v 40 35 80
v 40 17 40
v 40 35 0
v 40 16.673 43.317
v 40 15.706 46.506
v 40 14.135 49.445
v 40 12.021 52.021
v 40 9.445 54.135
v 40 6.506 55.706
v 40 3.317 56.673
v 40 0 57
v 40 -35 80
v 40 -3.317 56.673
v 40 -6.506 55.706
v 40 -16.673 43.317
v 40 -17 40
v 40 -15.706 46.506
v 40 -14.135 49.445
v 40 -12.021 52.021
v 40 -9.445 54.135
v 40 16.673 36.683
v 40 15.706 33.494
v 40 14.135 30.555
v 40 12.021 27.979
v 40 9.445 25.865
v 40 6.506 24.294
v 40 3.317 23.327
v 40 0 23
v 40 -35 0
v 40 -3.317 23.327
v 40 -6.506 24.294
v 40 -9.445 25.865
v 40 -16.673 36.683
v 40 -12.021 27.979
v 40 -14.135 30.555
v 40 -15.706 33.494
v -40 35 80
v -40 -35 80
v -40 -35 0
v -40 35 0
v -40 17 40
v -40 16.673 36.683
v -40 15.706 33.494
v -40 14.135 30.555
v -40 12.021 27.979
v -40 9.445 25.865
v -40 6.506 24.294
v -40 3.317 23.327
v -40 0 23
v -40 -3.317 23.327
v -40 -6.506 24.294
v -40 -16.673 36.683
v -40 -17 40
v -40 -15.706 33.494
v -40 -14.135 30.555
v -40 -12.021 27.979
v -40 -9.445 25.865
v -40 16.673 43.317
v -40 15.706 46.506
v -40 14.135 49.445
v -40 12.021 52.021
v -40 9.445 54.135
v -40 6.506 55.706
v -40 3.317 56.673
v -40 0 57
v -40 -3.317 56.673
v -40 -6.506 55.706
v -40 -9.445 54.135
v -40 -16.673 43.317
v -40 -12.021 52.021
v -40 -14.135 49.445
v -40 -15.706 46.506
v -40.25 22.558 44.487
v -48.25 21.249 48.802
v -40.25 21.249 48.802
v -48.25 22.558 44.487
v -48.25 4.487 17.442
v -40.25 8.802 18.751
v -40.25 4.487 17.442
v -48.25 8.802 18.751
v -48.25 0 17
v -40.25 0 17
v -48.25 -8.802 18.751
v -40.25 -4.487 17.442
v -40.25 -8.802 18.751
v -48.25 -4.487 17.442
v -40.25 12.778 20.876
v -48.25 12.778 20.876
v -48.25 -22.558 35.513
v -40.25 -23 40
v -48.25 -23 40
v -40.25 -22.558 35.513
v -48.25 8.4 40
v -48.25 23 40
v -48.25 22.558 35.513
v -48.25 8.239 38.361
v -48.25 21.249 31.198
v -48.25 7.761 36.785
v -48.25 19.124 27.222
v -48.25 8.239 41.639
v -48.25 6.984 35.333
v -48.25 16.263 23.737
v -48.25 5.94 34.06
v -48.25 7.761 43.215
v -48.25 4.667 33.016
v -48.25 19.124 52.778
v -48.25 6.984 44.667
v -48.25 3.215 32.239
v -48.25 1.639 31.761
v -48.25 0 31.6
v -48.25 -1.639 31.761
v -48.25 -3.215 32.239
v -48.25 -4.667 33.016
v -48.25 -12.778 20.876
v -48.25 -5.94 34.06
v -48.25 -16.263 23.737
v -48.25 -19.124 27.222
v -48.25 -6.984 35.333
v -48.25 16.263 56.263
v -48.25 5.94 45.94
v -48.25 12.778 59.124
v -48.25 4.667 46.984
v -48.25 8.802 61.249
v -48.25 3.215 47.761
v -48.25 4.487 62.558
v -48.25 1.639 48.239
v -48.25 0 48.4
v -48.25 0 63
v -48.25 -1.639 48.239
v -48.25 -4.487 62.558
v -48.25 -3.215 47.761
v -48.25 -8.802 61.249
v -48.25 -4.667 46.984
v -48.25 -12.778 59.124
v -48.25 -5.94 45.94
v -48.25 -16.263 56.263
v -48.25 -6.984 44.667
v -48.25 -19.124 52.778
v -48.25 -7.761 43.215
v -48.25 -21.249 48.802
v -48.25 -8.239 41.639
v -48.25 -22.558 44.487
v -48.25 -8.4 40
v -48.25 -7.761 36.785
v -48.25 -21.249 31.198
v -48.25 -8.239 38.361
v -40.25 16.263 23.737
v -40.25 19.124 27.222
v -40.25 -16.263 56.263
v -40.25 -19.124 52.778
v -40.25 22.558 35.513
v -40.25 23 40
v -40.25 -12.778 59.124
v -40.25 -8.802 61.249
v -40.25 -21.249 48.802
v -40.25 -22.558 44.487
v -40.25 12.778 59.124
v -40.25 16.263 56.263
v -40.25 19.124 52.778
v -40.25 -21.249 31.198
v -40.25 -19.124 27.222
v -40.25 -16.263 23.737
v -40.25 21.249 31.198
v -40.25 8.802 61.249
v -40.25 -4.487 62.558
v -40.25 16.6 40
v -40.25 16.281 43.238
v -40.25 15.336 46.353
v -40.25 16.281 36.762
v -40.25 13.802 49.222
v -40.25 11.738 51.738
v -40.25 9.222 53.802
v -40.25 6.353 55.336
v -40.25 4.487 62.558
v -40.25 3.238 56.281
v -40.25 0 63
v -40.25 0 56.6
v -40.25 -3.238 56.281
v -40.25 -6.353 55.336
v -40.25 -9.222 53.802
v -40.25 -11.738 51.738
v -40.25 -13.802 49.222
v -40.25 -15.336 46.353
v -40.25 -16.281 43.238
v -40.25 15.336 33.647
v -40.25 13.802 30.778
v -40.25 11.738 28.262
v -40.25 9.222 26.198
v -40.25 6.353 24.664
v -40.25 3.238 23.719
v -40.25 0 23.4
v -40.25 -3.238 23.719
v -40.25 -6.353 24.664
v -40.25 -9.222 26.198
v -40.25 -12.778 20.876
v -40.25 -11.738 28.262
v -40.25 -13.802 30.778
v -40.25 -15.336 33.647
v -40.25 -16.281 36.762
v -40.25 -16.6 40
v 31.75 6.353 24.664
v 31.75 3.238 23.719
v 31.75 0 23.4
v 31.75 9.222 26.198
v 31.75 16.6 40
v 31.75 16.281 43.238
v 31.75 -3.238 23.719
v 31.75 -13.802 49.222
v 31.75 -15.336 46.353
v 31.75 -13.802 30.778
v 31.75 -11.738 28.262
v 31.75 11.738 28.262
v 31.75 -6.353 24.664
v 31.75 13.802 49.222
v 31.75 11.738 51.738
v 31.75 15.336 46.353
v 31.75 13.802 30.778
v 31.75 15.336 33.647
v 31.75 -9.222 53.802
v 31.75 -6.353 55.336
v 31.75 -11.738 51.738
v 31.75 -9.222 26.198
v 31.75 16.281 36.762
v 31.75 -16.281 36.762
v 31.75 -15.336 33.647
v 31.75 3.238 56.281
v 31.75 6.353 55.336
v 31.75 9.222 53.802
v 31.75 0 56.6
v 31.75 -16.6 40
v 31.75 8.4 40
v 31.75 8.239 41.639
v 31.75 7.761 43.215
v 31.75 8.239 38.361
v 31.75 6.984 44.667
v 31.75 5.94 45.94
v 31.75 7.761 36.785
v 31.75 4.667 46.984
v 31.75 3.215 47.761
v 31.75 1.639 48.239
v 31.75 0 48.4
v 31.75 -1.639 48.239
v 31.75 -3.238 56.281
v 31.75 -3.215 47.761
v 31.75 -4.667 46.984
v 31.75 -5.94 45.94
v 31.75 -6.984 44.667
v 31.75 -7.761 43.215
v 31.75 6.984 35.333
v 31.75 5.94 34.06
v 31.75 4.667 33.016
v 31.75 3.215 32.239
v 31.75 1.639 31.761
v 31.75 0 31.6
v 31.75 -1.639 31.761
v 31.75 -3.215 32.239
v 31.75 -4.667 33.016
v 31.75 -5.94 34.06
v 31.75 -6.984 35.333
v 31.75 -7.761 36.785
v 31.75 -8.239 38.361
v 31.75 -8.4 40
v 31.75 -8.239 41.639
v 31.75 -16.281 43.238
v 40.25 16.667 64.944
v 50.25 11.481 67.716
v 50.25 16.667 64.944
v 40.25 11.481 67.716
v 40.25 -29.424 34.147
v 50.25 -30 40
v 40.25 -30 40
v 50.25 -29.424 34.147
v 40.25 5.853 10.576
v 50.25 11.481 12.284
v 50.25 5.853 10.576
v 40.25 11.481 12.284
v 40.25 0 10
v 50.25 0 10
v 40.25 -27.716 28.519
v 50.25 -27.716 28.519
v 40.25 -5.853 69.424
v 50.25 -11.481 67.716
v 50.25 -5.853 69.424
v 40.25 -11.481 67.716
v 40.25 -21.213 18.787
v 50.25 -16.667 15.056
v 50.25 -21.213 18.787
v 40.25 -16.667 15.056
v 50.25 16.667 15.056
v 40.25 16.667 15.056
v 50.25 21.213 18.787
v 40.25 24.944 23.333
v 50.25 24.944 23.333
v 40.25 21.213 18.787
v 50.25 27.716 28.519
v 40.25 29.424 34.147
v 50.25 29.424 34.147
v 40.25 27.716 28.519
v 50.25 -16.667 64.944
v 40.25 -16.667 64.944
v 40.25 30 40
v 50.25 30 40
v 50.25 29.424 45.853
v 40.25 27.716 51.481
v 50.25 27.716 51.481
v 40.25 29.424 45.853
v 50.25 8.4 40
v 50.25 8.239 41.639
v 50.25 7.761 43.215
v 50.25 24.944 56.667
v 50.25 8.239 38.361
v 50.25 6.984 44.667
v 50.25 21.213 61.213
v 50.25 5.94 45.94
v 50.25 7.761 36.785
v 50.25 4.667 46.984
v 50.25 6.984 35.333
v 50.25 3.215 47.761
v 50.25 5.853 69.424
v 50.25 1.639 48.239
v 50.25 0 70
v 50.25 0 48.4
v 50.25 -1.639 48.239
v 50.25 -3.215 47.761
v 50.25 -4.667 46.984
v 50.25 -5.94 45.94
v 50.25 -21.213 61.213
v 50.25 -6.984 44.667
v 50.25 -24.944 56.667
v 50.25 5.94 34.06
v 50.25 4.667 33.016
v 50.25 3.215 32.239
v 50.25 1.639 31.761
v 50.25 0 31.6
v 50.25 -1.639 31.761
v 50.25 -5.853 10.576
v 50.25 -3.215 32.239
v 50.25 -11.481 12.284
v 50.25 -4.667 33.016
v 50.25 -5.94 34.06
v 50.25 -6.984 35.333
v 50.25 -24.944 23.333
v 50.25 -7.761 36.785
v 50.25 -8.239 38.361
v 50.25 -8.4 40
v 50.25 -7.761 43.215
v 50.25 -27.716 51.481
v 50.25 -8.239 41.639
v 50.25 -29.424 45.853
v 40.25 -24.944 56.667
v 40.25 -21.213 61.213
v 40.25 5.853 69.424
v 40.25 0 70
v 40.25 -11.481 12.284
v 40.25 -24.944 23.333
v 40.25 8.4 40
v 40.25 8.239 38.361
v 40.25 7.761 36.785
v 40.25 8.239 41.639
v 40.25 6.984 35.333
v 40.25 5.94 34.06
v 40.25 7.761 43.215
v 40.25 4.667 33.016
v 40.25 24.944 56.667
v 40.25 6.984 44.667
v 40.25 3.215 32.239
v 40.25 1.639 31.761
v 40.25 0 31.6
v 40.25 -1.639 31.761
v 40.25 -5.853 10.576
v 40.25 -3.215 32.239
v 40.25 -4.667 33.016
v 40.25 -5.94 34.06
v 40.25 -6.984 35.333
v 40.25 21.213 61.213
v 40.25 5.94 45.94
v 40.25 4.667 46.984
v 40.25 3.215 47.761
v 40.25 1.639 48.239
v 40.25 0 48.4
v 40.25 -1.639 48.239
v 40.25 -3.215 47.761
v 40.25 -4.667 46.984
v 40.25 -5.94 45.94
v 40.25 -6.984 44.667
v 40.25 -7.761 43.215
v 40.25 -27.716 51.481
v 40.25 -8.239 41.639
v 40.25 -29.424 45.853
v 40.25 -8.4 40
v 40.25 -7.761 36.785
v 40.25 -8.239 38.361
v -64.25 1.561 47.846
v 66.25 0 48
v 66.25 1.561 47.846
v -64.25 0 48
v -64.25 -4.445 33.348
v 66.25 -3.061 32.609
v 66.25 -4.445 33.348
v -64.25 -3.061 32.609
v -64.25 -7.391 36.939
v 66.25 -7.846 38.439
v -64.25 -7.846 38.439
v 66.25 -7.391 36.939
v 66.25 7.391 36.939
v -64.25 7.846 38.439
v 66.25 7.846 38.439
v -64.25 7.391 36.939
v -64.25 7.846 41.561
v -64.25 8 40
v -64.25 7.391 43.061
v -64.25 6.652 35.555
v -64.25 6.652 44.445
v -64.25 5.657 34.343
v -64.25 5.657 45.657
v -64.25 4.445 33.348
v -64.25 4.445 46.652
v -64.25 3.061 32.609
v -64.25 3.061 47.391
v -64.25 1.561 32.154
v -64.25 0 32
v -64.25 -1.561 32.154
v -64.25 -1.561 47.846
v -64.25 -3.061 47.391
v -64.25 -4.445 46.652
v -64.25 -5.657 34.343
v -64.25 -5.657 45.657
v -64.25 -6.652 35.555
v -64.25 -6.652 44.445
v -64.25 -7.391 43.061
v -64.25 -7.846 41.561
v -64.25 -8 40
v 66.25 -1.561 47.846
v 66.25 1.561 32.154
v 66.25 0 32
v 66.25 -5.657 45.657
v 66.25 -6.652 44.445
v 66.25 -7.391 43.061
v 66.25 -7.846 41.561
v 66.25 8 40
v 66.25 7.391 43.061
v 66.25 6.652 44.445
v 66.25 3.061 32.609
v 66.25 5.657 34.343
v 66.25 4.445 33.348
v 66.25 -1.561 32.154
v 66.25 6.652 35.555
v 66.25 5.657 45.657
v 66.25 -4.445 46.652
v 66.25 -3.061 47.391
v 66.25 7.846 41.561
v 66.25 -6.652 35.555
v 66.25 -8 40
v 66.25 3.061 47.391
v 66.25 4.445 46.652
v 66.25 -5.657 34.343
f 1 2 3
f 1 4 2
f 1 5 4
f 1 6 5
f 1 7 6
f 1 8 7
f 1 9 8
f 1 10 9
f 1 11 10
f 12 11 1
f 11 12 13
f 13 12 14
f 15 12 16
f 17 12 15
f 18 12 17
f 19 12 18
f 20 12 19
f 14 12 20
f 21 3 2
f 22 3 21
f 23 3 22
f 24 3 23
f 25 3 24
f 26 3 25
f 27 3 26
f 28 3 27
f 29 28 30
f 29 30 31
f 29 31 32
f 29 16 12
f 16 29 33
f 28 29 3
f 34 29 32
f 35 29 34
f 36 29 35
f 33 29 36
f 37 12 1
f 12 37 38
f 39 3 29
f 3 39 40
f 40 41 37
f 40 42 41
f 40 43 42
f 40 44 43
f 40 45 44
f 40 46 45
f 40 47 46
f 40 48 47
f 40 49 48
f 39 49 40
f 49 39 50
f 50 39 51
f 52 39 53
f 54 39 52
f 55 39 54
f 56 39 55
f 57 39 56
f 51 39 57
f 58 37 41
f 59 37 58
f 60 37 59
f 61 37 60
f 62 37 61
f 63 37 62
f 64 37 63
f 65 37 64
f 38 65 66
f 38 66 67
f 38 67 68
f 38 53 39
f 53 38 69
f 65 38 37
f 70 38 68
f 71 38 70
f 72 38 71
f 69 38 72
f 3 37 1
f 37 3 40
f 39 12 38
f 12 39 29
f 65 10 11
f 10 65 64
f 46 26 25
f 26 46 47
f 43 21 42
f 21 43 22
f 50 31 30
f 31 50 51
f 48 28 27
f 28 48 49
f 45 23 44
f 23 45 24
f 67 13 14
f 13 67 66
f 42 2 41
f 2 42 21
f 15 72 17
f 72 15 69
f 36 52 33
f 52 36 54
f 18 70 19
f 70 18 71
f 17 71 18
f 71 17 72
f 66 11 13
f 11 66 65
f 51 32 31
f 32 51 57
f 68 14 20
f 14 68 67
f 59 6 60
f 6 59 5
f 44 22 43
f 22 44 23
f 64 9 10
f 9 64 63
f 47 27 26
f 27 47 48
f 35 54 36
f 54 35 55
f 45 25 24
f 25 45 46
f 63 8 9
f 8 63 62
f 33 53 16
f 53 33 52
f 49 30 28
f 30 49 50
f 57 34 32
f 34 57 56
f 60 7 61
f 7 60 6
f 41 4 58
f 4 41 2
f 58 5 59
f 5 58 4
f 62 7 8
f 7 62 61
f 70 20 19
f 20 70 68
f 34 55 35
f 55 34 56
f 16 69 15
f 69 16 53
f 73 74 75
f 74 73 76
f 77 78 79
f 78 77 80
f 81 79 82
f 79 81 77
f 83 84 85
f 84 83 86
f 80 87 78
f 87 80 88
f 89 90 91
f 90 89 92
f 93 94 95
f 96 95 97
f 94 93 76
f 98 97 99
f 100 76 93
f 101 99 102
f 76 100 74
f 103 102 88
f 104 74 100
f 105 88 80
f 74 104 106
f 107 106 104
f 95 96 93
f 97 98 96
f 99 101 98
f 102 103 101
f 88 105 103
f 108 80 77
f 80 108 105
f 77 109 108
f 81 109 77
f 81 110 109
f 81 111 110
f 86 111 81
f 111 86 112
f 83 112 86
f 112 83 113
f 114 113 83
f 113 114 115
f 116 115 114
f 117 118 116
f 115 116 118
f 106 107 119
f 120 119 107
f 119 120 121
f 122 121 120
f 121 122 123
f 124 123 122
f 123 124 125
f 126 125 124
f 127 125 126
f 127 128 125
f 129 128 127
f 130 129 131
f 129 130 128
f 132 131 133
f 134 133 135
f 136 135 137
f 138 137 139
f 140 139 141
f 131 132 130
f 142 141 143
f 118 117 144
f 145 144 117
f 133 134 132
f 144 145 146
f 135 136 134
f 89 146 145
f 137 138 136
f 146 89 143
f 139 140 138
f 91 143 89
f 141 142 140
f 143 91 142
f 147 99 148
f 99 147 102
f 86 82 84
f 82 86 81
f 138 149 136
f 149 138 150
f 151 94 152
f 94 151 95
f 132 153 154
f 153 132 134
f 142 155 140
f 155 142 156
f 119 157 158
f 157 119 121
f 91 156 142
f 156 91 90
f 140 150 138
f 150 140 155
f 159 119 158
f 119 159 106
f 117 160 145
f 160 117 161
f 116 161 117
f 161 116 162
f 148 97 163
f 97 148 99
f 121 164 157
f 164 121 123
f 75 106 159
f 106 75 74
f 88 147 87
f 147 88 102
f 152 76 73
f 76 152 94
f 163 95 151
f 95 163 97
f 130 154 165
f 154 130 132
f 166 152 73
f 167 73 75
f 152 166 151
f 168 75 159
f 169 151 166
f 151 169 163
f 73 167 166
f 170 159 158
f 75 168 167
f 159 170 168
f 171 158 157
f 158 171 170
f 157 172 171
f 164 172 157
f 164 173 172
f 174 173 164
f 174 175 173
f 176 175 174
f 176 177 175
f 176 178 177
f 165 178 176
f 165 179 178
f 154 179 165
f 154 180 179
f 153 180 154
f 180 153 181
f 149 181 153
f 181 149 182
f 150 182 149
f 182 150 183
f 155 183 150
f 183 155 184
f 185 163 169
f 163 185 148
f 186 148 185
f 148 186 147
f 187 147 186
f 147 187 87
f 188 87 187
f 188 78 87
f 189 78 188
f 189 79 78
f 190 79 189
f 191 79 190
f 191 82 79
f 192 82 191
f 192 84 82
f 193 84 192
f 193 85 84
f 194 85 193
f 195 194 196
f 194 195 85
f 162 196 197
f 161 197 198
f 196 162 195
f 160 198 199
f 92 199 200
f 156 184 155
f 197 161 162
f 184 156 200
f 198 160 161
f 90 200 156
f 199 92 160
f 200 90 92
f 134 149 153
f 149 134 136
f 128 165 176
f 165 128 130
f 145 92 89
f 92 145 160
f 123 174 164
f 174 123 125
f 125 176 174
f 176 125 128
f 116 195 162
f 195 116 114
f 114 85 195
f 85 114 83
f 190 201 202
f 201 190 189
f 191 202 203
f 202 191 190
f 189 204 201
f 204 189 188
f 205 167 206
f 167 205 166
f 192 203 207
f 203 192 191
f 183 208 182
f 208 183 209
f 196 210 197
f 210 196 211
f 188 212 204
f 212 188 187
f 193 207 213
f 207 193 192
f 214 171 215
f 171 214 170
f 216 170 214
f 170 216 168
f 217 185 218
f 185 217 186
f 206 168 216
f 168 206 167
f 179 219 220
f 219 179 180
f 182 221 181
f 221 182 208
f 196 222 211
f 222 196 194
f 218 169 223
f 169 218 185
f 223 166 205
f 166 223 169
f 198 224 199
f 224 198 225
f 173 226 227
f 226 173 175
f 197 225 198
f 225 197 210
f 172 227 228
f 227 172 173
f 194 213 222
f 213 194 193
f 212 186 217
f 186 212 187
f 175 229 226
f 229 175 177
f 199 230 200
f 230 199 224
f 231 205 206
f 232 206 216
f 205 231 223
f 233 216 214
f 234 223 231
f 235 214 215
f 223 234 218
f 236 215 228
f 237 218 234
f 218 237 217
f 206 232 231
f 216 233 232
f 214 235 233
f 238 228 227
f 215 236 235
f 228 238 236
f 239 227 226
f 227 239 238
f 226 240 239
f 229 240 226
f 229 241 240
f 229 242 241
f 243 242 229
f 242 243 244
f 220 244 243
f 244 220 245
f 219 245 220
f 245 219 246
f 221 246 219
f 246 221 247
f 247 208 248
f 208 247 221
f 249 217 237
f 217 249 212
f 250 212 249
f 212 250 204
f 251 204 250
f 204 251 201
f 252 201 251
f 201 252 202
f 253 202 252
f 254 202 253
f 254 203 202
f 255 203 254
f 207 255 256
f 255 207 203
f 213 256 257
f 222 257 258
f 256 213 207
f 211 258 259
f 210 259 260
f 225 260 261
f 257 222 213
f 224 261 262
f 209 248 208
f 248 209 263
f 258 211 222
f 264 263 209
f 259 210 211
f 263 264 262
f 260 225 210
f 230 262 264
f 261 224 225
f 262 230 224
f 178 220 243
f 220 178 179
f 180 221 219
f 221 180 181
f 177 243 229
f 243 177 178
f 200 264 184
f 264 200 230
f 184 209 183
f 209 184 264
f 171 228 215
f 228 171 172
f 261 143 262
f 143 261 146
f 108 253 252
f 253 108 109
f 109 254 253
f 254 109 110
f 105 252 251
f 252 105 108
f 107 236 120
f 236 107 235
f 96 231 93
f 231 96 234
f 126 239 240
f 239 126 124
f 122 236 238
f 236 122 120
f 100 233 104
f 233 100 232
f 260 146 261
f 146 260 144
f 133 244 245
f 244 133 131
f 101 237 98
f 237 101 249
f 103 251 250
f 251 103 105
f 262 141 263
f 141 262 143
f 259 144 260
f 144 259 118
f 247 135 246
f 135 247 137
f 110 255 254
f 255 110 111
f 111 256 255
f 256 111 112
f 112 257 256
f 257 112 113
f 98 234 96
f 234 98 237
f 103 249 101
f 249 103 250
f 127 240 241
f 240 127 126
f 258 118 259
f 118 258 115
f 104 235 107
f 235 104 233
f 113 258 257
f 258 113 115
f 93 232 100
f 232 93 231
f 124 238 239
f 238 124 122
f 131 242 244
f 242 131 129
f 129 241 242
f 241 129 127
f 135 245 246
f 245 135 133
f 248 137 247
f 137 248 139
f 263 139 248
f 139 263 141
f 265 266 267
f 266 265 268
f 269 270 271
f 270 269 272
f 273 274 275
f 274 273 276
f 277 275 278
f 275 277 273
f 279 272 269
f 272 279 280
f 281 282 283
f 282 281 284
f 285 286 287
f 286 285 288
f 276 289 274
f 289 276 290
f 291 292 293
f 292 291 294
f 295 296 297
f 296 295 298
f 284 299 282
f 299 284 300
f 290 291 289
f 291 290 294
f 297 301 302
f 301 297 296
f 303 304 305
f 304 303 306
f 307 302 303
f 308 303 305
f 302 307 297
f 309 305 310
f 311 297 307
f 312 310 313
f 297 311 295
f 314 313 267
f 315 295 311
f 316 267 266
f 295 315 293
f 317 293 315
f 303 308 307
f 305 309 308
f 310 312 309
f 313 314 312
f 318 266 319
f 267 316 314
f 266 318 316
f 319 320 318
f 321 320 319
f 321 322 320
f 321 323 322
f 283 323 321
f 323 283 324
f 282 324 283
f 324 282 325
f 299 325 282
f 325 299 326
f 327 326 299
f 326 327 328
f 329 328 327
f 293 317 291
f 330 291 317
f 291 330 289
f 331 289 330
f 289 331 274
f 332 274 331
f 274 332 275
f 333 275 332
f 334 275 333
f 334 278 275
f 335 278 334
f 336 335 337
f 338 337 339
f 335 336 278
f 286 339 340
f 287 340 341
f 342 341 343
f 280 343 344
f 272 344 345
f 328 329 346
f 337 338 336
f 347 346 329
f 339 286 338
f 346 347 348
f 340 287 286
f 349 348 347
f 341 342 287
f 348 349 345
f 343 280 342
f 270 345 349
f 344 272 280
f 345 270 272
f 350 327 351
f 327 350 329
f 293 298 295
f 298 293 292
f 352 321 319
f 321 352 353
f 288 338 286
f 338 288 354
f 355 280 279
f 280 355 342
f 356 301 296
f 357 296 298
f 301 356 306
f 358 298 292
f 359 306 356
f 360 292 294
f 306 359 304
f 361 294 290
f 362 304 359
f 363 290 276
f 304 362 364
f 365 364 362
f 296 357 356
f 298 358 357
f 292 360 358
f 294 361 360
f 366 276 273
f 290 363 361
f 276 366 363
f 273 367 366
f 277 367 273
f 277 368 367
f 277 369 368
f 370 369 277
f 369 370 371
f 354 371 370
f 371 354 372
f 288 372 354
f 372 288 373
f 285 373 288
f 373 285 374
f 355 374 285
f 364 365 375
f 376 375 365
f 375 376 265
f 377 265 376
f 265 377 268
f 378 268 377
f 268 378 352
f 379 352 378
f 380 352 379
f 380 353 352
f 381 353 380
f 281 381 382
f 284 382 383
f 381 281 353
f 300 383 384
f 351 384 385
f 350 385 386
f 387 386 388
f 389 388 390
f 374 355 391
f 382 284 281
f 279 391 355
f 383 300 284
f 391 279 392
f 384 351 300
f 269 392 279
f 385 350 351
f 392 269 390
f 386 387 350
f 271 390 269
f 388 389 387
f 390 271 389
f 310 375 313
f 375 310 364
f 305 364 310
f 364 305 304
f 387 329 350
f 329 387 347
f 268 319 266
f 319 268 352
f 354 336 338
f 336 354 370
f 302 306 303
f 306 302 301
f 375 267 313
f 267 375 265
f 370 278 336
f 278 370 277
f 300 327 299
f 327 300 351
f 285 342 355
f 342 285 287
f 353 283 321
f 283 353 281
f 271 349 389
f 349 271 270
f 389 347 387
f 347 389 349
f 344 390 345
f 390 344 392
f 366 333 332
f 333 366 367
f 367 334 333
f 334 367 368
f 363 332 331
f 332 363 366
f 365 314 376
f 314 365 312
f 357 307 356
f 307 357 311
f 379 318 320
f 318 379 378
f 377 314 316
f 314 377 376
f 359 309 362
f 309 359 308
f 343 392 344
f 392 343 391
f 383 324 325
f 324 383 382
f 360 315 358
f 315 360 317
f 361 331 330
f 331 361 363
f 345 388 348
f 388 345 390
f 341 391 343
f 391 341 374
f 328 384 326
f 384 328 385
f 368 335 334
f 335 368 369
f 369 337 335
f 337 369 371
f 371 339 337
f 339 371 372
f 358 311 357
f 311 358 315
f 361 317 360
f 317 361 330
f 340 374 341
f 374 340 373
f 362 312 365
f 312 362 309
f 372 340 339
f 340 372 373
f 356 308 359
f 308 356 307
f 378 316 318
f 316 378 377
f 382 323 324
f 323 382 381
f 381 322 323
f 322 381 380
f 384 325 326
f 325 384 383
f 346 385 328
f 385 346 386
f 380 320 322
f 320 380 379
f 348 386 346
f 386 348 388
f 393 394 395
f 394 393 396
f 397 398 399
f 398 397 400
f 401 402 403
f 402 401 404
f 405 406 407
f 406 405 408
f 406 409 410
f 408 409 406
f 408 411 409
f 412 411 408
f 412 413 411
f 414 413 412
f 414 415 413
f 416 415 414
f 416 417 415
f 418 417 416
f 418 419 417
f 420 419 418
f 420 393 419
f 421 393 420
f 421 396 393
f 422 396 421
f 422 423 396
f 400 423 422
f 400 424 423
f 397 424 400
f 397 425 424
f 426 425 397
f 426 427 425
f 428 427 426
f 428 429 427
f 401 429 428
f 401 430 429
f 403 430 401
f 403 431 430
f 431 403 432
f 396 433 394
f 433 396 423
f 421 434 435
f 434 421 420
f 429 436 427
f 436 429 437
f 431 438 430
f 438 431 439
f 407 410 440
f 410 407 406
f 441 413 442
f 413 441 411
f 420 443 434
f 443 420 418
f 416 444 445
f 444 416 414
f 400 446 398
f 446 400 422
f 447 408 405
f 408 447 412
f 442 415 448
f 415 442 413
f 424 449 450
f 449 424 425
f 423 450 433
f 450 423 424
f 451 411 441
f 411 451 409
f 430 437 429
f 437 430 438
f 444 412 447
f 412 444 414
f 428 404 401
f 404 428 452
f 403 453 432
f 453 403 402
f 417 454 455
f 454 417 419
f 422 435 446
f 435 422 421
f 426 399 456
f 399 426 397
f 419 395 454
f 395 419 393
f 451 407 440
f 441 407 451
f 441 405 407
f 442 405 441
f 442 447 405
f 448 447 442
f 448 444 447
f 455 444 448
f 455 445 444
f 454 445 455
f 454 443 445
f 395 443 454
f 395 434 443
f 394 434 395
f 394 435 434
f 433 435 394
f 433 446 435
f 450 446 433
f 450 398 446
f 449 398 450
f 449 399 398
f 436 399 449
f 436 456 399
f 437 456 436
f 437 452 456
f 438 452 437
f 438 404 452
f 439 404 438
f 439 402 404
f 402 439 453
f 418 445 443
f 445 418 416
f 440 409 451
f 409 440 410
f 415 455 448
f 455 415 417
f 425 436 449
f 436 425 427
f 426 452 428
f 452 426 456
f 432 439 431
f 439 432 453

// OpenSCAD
$fn = 32;

// ------------------------------------------------------------------------
// Bushed housing: 80 x 70 x 80 mm housing, bushing d33.2
// Every part is its own module, assembly() places them once.
// ------------------------------------------------------------------------

// --- part 1 ---
module housing() {
  difference() {
    translate([-40, -35, 0]) cube([80, 70, 80]);
    translate([0, 0, 40]) rotate([0, 90, 0]) cylinder(h = 82, d = 34, center = true);
  }
}

// --- part 2 ---
module bushing() {
  difference() {
    union() {
      cylinder(h = 8, d = 46);
      translate([0, 0, 8]) cylinder(h = 72, d = 33.2);
    }
    translate([0, 0, -1]) cylinder(h = 82, d = 16.8);
  }
}

// --- part 3 ---
module shaft() {
  translate([0, 0, -65.25]) cylinder(h = 130.5, d = 16);
}

// --- part 4 ---
module cover() {
  difference() {
    cylinder(h = 10, d = 60);
    translate([0, 0, -1]) cylinder(h = 12, d = 16.8);
  }
}

// --- assembly ---
module assembly() {
  translate([0, 0, 0]) rotate([0, 0, 0]) housing();
  translate([-48.25, 0, 40]) rotate([0, 90, 0]) bushing();
  translate([1, 0, 40]) rotate([0, 90, 0]) shaft();
  translate([40.25, 0, 40]) rotate([0, 90, 0]) cover();
}

assembly();
